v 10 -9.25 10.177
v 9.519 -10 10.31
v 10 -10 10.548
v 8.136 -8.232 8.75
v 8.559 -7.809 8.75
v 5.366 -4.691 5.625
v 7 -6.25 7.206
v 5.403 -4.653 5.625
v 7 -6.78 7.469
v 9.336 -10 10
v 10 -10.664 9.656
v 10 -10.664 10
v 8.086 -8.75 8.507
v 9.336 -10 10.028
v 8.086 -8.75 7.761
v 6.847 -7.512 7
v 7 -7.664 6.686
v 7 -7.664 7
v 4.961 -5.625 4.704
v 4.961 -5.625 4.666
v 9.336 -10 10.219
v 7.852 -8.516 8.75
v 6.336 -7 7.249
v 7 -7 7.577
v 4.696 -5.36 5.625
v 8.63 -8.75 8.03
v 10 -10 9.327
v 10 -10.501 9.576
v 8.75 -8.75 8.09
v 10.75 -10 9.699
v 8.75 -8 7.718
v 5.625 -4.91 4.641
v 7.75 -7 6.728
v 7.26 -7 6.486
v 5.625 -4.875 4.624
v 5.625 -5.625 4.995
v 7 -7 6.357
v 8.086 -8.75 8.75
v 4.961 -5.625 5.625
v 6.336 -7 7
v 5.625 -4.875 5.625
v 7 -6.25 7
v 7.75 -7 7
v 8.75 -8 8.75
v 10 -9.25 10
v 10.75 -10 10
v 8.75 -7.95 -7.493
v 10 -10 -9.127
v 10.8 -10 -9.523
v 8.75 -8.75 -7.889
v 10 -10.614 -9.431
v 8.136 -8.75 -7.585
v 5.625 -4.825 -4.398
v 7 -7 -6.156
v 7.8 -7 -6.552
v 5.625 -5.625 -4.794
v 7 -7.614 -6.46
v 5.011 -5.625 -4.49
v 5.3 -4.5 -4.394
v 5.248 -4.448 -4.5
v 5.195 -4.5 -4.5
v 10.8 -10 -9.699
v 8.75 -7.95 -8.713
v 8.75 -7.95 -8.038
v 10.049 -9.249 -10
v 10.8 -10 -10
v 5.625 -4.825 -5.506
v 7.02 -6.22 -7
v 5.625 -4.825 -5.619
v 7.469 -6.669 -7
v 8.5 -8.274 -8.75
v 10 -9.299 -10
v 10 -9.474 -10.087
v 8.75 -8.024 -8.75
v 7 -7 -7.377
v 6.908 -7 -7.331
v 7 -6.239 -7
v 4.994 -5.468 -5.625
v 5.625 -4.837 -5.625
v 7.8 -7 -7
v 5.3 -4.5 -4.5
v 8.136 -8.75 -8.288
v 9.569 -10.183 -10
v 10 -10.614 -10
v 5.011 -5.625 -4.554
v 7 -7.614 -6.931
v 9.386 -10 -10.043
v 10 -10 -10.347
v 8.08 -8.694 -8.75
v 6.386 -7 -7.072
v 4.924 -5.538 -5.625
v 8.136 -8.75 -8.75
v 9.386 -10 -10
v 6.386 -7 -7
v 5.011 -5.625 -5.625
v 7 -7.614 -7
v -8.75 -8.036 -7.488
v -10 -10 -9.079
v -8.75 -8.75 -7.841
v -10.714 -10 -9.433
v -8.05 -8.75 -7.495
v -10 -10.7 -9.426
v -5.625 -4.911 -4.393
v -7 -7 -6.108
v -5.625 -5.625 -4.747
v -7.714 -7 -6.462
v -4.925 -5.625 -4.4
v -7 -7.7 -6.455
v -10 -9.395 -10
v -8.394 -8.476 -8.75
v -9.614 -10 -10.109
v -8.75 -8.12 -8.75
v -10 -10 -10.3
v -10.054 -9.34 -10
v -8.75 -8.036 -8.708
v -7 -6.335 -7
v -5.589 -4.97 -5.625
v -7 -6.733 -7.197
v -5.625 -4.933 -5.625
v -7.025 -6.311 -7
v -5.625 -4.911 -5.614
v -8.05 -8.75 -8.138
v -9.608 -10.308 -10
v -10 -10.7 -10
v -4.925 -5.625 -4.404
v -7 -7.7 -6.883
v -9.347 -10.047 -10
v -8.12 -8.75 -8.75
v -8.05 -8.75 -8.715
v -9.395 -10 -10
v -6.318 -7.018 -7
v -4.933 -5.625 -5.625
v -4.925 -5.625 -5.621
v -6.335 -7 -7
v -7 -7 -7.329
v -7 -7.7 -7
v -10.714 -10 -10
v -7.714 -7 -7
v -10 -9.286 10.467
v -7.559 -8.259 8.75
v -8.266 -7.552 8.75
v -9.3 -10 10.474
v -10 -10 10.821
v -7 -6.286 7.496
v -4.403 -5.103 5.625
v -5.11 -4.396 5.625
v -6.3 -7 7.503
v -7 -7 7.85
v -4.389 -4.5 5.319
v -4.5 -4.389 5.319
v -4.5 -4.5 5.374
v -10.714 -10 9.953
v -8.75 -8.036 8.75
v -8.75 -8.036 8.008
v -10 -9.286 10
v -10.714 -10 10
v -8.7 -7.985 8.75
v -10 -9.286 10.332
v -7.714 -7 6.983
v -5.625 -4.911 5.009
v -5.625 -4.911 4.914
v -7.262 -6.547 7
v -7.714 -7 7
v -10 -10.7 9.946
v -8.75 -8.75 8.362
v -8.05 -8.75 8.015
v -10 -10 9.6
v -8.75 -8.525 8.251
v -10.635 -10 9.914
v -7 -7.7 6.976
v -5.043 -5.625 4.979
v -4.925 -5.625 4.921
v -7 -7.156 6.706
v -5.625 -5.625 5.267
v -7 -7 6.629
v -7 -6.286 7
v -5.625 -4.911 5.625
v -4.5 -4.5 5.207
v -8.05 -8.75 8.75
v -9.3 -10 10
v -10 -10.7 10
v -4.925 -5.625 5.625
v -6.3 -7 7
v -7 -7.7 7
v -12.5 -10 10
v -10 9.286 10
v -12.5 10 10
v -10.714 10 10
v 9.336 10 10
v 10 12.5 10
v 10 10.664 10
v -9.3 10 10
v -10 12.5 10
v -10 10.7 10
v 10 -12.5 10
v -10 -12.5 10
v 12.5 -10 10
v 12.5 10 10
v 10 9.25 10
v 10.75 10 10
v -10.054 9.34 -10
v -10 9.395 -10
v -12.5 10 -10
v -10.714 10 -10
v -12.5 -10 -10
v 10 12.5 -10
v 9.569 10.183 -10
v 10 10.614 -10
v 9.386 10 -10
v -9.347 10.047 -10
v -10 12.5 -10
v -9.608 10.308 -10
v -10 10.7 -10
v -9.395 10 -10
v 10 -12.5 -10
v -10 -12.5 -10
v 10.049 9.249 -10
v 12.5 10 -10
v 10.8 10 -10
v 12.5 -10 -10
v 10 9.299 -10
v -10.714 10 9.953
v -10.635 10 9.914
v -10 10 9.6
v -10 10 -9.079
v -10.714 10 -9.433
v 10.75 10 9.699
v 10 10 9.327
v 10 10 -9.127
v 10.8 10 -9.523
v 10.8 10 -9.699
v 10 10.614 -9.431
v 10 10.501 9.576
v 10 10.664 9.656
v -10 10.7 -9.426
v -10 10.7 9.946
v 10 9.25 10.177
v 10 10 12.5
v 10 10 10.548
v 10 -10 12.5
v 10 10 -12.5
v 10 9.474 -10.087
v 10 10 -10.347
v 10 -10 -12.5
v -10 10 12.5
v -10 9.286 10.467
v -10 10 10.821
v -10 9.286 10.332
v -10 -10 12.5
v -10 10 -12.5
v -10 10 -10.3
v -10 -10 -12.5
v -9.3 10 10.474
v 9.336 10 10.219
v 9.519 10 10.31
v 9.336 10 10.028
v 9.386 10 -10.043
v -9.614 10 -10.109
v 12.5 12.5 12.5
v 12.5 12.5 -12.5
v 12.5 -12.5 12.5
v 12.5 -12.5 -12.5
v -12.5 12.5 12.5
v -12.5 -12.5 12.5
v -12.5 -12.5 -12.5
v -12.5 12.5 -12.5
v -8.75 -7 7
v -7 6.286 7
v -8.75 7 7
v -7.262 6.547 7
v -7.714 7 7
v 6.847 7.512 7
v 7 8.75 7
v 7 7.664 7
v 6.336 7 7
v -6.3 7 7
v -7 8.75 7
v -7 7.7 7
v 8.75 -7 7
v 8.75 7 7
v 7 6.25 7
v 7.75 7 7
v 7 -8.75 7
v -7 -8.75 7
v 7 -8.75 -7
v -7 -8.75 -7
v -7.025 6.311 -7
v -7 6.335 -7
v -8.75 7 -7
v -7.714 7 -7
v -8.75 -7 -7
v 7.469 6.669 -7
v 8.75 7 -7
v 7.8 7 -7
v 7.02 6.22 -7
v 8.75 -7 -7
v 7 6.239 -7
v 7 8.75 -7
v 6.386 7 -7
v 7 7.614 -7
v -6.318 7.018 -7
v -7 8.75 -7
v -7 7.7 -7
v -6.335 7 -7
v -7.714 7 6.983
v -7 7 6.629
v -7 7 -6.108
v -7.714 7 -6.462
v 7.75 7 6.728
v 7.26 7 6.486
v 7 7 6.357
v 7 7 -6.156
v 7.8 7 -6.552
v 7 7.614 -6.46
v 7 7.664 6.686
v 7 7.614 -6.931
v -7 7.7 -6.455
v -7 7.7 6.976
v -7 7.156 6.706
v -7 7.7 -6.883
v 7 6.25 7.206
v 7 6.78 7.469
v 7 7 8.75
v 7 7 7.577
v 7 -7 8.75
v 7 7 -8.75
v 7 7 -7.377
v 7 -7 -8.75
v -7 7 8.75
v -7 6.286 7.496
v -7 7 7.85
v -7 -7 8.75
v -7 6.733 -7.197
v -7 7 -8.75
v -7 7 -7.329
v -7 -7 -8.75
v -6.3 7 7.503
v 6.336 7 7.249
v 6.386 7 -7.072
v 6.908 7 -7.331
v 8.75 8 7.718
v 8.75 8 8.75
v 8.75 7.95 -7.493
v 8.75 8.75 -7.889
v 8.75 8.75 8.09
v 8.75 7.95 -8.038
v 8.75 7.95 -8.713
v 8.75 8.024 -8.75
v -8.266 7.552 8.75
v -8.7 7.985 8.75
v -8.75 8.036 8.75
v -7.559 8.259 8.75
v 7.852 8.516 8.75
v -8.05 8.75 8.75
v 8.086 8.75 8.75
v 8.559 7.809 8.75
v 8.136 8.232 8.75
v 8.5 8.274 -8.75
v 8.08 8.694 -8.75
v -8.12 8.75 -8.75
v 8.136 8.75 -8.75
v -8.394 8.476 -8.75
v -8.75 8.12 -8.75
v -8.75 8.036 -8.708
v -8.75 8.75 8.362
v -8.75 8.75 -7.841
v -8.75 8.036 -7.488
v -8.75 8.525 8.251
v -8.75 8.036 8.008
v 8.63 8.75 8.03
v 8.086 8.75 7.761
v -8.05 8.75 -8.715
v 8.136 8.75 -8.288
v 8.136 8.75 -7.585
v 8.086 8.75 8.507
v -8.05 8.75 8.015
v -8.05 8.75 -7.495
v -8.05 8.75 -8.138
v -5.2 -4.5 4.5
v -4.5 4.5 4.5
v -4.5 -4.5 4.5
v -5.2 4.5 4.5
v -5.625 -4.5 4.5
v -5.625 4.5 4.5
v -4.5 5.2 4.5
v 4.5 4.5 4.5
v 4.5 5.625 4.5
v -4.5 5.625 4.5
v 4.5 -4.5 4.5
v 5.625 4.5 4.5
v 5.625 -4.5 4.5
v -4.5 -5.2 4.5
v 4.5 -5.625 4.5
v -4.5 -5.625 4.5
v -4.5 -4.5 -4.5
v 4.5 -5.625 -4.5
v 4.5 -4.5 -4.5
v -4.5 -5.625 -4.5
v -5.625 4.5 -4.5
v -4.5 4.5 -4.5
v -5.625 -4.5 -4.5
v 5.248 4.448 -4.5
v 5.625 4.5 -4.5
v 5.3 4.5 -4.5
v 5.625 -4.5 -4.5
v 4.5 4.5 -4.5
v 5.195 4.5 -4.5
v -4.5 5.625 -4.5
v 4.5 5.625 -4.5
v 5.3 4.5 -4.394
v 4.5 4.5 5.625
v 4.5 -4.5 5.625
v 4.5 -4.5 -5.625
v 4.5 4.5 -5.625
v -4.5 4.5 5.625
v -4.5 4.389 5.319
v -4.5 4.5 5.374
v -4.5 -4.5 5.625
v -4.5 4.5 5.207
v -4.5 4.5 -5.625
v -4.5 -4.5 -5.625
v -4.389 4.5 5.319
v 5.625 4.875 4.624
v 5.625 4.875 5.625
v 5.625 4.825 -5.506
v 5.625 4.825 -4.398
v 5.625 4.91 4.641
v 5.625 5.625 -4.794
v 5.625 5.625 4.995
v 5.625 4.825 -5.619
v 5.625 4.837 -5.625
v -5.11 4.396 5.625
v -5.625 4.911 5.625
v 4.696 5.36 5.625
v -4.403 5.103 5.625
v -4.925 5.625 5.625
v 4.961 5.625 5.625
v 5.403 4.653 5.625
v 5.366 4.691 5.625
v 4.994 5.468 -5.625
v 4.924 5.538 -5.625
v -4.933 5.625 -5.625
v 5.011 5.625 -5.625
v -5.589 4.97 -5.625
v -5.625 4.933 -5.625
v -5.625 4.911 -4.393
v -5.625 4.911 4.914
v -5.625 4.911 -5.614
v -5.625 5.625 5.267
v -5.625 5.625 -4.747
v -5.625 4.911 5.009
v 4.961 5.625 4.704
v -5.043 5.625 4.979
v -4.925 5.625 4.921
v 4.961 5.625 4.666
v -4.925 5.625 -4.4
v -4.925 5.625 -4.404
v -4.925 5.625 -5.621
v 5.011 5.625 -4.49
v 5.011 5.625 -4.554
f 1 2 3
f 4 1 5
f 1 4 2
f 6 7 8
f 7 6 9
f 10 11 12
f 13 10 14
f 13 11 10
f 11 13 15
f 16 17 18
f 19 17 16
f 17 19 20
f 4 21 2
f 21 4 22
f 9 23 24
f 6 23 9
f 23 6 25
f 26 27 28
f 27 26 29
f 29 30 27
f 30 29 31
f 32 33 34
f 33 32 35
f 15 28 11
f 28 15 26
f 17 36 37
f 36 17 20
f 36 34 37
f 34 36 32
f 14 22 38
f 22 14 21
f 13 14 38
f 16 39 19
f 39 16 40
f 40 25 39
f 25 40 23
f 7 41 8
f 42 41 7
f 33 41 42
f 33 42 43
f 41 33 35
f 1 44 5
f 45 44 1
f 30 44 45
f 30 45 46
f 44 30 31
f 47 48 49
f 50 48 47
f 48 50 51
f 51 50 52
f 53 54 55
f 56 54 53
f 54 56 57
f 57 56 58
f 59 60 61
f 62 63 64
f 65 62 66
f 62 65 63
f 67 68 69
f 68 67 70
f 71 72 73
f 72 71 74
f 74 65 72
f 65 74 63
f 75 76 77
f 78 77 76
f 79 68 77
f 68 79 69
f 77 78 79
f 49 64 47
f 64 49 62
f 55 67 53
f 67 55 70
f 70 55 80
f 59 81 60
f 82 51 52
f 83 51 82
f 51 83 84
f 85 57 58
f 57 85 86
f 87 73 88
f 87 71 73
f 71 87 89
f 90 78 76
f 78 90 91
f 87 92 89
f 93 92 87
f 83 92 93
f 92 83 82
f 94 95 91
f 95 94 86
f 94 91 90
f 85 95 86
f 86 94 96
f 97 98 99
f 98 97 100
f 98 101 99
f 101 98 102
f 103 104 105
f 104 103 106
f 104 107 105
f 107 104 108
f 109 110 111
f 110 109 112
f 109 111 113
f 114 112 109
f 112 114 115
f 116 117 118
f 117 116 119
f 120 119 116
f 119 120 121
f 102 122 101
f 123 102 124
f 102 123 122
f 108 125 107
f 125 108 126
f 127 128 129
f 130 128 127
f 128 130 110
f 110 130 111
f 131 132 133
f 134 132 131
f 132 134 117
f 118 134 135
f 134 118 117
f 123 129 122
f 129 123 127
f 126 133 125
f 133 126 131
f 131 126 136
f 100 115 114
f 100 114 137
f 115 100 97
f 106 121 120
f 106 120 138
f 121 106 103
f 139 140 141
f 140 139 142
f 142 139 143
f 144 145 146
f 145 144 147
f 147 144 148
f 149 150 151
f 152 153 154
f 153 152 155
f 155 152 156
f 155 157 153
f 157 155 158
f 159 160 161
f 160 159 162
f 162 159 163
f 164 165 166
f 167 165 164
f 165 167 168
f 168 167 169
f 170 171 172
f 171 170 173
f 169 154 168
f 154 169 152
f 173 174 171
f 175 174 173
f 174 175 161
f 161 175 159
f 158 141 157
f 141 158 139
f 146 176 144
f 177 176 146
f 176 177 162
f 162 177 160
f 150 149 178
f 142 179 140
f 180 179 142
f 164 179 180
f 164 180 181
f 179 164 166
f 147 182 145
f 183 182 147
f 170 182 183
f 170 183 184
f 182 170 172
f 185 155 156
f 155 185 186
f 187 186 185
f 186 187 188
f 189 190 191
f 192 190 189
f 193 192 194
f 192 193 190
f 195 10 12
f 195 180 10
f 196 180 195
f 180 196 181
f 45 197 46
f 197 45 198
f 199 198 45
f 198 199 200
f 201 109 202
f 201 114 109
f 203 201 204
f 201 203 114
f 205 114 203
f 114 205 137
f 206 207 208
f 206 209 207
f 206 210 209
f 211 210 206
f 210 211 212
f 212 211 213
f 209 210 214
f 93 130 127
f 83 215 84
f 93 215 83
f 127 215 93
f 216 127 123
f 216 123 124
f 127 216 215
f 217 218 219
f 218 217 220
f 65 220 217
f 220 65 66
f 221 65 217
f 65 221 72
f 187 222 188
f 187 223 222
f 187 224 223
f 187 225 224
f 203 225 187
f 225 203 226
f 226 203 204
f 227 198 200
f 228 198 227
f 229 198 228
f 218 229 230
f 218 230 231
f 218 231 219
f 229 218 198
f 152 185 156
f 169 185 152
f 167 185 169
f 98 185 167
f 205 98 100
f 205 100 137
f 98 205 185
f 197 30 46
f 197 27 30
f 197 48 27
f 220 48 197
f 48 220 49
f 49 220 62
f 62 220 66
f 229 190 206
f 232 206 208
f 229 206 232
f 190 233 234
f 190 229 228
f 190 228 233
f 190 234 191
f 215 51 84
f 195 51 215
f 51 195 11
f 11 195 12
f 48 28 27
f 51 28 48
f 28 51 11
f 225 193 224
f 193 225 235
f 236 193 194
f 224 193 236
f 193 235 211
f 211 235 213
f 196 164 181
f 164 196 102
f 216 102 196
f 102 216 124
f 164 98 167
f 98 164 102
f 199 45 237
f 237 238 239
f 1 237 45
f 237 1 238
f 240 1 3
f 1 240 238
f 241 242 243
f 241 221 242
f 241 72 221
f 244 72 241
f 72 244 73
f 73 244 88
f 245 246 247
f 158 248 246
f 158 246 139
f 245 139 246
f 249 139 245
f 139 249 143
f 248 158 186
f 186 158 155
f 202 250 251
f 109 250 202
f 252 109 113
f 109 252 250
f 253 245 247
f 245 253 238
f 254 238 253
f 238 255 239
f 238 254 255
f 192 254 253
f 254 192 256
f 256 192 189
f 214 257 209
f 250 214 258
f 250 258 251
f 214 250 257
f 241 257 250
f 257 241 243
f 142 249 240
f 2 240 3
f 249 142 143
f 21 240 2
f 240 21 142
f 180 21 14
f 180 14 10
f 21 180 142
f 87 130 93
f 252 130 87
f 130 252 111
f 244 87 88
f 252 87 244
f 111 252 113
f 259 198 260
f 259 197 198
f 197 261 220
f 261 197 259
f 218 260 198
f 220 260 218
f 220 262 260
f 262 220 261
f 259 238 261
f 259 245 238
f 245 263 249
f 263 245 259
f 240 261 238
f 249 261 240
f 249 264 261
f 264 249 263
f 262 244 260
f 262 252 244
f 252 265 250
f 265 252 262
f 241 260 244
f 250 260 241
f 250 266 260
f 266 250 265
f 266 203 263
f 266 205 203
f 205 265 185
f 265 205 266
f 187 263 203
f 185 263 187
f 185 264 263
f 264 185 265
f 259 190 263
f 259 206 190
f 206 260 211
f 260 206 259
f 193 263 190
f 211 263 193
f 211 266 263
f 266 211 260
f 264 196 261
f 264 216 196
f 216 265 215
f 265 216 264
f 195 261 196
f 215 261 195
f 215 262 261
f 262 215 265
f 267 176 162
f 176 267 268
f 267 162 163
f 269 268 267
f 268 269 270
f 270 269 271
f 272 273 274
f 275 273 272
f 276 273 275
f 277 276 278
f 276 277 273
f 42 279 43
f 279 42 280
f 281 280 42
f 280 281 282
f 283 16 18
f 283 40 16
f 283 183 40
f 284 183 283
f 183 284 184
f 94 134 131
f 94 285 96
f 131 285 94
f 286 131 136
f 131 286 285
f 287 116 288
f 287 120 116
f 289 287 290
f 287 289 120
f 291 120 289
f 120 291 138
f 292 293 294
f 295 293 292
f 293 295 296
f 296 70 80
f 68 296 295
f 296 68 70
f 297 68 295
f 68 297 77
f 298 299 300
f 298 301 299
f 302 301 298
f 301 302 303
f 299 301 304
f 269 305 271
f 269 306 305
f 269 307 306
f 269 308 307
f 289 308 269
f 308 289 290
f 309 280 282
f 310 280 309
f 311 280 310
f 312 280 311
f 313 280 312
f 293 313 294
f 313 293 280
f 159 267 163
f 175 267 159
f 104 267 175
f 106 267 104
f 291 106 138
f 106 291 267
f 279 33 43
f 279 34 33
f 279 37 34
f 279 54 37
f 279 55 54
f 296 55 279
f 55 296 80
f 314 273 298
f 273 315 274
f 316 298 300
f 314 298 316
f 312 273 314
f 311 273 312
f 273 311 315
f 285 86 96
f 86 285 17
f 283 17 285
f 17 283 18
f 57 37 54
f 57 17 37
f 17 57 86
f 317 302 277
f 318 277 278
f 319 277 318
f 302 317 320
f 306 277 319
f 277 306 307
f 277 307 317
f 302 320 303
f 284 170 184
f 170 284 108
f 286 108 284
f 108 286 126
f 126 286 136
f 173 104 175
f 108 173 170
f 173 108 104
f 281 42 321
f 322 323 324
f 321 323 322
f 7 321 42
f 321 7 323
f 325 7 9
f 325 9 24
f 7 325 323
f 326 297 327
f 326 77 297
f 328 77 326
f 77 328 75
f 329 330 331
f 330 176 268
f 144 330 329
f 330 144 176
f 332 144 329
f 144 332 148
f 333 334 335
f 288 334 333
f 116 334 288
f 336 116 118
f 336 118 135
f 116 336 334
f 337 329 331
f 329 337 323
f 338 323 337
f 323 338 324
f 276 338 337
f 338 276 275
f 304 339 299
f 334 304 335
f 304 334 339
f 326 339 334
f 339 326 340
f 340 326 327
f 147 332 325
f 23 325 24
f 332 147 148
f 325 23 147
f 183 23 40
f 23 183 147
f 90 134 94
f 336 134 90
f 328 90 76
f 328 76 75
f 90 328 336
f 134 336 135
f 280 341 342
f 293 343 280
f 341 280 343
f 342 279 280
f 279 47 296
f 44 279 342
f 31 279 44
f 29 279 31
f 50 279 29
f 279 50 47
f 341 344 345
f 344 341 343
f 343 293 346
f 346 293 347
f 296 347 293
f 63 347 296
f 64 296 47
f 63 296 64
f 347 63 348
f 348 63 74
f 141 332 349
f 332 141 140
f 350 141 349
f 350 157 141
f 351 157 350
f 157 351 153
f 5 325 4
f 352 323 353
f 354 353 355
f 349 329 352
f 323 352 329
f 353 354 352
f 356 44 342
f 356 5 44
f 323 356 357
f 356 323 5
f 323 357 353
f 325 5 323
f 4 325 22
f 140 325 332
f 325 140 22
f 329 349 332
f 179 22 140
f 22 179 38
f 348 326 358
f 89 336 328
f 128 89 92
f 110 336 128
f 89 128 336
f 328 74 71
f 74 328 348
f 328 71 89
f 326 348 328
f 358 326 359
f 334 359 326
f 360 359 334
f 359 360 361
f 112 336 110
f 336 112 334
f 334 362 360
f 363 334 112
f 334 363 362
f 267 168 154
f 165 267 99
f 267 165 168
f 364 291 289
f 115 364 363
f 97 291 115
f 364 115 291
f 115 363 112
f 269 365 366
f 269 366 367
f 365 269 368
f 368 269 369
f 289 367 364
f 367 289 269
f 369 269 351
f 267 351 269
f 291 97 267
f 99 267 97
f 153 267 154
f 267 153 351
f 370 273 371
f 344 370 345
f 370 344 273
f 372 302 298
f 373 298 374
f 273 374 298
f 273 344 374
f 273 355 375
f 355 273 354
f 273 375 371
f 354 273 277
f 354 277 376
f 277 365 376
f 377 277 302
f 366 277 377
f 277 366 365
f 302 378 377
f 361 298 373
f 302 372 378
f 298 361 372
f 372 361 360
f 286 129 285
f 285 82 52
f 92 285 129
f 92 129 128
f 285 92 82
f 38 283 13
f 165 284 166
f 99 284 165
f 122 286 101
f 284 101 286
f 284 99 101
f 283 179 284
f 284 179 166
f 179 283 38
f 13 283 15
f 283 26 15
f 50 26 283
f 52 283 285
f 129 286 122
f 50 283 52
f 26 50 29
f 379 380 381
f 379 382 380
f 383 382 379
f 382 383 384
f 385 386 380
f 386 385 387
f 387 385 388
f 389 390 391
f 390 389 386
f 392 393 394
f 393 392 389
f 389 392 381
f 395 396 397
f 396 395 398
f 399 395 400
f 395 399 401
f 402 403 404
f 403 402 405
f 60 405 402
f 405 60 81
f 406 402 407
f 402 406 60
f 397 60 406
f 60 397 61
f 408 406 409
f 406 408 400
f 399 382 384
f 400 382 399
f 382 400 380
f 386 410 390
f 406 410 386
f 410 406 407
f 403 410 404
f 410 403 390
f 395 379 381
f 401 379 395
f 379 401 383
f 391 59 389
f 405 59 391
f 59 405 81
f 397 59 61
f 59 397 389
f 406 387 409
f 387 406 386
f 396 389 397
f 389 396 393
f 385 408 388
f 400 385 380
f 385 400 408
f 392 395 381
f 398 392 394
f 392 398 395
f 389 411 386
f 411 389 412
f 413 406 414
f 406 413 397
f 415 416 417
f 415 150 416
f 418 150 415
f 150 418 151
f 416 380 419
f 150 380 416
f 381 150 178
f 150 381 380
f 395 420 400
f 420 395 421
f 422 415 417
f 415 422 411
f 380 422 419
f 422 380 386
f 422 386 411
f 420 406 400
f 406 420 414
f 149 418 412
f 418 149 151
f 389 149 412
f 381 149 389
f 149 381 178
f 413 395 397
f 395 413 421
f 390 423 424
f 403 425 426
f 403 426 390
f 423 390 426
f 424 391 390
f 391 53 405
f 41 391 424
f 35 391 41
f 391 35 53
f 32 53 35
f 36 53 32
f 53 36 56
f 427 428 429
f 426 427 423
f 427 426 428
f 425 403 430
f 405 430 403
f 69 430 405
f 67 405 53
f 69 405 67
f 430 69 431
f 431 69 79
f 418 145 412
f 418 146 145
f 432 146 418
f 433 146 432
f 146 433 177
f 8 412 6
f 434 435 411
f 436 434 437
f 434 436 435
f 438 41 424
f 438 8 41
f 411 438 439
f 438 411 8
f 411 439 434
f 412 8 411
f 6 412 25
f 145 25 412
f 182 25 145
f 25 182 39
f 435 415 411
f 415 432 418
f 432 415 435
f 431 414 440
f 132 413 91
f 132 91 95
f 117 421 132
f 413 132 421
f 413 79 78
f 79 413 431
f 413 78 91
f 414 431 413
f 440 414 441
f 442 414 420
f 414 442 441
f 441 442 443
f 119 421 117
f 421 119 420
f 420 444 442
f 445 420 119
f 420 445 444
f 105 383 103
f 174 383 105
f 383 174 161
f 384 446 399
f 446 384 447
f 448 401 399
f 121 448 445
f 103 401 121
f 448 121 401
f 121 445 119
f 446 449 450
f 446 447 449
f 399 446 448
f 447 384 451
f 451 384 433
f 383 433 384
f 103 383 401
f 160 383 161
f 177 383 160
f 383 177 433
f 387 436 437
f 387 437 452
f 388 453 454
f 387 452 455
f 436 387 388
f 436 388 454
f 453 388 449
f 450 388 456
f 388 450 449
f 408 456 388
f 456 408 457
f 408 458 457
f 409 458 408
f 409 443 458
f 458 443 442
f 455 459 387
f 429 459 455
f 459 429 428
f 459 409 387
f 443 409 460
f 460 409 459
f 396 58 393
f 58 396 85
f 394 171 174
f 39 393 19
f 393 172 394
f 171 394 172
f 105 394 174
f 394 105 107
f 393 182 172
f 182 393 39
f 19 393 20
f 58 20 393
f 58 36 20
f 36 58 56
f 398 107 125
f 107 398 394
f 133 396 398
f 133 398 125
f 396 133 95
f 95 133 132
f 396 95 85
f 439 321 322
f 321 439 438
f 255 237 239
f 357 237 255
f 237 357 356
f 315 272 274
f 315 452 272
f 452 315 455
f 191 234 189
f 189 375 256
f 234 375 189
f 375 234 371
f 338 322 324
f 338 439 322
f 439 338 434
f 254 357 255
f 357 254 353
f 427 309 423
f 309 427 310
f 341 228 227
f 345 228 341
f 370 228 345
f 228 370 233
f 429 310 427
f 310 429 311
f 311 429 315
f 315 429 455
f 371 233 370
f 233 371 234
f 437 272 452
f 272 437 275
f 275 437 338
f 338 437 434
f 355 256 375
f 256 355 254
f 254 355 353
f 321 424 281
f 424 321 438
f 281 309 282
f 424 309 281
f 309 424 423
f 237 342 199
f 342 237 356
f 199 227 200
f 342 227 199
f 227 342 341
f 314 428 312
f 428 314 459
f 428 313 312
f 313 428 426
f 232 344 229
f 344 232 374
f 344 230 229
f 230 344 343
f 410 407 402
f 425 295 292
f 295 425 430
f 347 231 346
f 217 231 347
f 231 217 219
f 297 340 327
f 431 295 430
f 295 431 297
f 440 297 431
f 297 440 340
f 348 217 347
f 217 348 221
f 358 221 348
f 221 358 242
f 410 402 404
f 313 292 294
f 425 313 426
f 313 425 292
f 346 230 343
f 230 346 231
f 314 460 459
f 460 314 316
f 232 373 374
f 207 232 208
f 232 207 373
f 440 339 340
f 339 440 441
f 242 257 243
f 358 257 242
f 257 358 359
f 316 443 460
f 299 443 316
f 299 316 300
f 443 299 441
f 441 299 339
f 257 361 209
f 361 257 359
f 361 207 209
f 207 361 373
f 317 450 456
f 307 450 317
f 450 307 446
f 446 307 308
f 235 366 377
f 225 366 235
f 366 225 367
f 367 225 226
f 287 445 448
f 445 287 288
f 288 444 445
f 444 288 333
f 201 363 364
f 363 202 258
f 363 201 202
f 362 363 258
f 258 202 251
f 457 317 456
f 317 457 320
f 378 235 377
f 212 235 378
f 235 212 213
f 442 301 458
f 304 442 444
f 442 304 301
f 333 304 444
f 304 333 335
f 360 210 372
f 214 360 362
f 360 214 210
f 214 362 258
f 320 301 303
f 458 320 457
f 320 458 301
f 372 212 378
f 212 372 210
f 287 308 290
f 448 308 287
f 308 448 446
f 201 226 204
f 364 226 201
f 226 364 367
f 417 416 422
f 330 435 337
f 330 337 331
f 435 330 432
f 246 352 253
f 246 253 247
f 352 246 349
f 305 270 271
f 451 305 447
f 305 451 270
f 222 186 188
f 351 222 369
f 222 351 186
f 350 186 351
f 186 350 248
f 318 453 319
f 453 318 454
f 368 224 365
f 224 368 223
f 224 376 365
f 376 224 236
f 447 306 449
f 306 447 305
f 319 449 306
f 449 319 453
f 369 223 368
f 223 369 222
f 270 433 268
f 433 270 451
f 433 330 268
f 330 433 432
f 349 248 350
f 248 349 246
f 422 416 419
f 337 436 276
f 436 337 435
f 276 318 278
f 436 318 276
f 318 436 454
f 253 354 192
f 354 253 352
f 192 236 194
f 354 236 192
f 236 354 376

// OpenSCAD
$fn=64;

//globals

module complexObject()
				
			{
			translate([5.5,4.75,4.5])
			rotate([0,-35,45])
			cube([10,1,1]);

			translate([5,4.2,-5])
			rotate([0,35,45])
			cube([11,1,1]);

			translate([-4.5,5.2,-5.2])
			rotate([0,35,135])
			cube([11,1,1]);
			
			translate([-4.5,5.2,4.5])
			rotate([0,-35,135])
			cube([10,1,1]);
			}
{
			mirror([0,1,0]){

			translate([5.5,4.75,4.5])
			rotate([0,-35,45])
			cube([10,1,1]);
			
			translate([5,4.2,-5])
			rotate([0,35,45])
			cube([11,1,1]);

			translate([-4.5,5.2,-5.2])
			rotate([0,35,135])
			cube([11,1,1]);
			
			translate([-4.5,5.2,4.5])
			rotate([0,-35,135])
			cube([10,1,1]);
			}
			}
			
{
			difference() {
			union()//add
				{	
					cube(25, center=true);
				}
				
				union()//subtract
				{
					cube([40,20,20], center=true);
					cube([20,40,20], center=true);
					cube([20,20,40], center=true);
					}
				}
			}

			scale(.7) {
			difference() {
			union()//add
				{	
					cube(25, center=true);
				}
				
				union()//subtract
				{
					cube([40,20,20], center=true);
					cube([20,40,20], center=true);
					cube([20,20,40], center=true);
					}
				}
			}

			scale(.45) {
			difference() {
			union()//add
				{	
					cube(25, center=true);
				}
				
				union()//subtract
				{
					cube([40,20,20], center=true);
					cube([20,40,20], center=true);
					cube([20,20,40], center=true);
					}
				}
			}

complexObject();
